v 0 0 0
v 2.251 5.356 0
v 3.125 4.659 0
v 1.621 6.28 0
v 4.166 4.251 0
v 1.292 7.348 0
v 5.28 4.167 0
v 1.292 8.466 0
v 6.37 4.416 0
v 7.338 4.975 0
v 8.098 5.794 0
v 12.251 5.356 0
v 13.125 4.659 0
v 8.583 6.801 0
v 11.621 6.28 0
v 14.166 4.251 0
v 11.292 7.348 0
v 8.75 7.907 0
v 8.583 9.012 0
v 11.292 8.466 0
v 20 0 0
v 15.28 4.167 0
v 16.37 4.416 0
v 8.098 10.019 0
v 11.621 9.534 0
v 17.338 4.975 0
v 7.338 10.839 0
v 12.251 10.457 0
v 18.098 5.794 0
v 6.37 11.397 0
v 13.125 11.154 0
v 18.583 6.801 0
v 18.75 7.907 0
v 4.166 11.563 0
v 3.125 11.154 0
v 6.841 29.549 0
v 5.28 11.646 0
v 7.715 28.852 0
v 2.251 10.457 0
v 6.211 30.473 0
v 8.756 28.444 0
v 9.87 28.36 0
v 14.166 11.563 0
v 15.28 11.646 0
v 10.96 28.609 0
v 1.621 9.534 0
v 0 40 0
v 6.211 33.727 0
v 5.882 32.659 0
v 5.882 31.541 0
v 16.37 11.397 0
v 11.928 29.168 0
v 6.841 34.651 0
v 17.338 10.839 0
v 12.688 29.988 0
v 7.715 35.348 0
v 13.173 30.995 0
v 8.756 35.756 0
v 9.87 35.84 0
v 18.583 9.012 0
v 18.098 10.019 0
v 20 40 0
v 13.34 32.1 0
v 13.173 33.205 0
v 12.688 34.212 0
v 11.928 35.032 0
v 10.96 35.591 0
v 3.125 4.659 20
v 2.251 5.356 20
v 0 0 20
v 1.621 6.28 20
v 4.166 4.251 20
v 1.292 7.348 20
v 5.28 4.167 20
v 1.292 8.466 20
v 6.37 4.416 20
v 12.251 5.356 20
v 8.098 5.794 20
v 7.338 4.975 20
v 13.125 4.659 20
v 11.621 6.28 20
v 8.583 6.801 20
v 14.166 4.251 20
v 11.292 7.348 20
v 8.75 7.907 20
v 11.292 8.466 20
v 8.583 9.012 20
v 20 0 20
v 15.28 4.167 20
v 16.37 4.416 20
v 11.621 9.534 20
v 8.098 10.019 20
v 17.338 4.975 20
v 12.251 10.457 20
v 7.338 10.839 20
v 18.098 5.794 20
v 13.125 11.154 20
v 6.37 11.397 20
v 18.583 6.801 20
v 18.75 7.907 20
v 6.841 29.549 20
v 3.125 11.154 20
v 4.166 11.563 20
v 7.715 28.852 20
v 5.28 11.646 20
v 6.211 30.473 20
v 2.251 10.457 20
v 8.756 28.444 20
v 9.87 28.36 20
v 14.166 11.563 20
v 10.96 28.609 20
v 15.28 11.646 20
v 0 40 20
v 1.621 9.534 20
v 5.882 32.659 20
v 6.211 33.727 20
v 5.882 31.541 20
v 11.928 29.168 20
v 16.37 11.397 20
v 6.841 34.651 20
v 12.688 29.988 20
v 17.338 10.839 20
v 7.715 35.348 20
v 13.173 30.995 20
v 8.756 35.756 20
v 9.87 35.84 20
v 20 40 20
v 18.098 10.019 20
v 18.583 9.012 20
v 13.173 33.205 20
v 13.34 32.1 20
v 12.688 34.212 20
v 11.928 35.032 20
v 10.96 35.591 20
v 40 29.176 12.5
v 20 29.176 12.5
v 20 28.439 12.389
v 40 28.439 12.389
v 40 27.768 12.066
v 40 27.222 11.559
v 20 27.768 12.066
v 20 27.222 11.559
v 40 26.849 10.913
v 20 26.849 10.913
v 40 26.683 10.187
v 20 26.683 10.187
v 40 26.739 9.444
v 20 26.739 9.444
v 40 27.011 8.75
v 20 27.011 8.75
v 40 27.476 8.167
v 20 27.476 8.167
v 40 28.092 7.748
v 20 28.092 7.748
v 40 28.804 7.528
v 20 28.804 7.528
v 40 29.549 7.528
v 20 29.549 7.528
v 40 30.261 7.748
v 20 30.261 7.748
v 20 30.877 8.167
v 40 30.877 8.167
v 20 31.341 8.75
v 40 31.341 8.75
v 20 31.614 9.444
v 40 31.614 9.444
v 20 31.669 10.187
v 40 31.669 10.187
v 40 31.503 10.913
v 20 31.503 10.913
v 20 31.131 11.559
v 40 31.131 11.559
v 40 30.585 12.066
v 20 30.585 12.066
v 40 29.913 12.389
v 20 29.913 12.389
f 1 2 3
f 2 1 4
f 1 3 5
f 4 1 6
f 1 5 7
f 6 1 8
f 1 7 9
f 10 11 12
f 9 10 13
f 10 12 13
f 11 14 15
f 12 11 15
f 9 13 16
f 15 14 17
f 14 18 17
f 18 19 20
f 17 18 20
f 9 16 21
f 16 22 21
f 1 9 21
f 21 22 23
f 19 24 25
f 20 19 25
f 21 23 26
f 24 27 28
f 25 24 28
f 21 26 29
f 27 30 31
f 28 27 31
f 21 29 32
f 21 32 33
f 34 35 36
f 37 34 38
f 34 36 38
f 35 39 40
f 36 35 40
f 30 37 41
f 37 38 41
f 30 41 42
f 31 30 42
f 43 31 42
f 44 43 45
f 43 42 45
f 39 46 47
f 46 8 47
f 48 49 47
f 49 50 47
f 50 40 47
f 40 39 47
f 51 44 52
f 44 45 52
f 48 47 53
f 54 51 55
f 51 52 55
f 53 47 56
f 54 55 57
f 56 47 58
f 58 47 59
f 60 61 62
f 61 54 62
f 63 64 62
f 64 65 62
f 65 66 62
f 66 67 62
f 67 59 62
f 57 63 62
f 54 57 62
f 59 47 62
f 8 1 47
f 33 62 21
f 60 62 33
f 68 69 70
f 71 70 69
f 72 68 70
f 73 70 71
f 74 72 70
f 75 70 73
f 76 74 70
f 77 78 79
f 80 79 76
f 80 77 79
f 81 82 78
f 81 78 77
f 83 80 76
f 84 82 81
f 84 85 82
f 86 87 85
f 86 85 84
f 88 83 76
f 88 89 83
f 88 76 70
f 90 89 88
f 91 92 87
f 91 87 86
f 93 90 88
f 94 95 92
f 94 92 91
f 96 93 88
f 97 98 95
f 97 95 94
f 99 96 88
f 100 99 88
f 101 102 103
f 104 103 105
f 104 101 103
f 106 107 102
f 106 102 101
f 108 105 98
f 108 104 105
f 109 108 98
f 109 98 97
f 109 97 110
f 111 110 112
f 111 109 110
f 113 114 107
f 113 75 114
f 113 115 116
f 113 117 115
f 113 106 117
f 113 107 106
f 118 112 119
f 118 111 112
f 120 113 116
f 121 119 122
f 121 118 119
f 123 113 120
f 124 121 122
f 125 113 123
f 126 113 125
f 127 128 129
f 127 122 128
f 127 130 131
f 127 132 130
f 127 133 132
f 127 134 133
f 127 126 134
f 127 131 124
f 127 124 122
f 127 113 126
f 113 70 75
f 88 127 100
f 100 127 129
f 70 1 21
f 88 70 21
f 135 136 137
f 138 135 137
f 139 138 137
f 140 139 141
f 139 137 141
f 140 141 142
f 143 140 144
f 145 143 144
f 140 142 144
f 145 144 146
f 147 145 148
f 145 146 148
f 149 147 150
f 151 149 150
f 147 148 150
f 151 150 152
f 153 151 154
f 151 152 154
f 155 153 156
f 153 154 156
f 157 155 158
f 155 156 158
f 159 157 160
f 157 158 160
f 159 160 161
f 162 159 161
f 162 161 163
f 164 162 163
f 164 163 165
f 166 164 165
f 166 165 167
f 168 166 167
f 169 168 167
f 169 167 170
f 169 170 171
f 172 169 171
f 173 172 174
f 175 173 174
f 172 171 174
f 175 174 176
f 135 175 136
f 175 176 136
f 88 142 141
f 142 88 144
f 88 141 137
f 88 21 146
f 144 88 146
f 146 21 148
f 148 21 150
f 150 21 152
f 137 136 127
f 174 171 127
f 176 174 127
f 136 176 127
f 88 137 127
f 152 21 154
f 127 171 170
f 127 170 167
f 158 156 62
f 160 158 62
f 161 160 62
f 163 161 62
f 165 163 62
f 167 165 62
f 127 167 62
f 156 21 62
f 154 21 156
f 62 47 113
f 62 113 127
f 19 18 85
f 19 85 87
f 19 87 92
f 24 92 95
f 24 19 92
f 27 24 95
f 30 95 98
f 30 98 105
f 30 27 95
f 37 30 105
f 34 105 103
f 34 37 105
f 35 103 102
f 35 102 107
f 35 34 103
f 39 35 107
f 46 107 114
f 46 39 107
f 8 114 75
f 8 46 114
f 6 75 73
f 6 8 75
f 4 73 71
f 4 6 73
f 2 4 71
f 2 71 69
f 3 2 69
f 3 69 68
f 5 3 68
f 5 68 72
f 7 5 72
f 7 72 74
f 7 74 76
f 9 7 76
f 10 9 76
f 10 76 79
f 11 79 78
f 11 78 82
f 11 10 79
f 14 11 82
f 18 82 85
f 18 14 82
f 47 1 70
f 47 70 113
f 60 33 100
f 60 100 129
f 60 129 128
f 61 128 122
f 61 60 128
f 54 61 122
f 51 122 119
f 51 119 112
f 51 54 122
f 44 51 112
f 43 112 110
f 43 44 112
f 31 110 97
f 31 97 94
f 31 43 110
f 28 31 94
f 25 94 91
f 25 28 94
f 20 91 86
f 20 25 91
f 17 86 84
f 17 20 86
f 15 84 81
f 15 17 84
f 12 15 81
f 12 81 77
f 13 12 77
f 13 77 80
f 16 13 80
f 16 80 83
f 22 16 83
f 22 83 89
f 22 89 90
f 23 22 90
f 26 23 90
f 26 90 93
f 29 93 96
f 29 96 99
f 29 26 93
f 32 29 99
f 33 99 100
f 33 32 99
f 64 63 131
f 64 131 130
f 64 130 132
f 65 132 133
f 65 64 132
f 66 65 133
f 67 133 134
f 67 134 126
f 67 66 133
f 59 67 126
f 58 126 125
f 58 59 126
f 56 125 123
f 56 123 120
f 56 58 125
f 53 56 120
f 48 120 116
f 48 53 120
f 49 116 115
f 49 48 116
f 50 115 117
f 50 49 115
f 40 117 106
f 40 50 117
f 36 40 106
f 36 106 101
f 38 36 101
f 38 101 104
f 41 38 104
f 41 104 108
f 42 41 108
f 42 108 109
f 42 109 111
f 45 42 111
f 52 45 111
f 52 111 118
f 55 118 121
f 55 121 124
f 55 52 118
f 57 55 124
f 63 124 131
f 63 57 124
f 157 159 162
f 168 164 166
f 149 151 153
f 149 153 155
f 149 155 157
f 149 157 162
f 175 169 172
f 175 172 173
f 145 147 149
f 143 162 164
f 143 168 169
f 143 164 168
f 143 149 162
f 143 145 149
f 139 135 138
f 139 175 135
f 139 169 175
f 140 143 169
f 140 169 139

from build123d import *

# Parameters (mm, degrees)
SKETCH7_W           = 20
SKETCH7_H           = 40
SKETCH7_R           = 3.75
BOSS_EXTRUDE4_DEPTH = 20
SKETCH8_R           = 2.5
BOSS_EXTRUDE5_DEPTH = 20


with BuildPart() as part:
    # Sketch7 → Boss-Extrude4 (new body)
    with BuildSketch(Plane.XY):
        with Locations((10, 20)):
            Rectangle(SKETCH7_W, SKETCH7_H)
        with Locations((15, 7.90672248)):
            Circle(SKETCH7_R, mode=Mode.SUBTRACT)
        with Locations((5, 7.90672248)):
            Circle(SKETCH7_R, mode=Mode.SUBTRACT)
        with Locations((9.590015998, 32.1)):
            Circle(SKETCH7_R, mode=Mode.SUBTRACT)
    extrude(amount=BOSS_EXTRUDE4_DEPTH)

    # Sketch8 → Boss-Extrude5 (add)
    with BuildSketch(Plane(origin=(20, 0, 0), x_dir=(0, 0, -1), z_dir=(1, 0, 0))):
        with Locations(Location((-10, 29.176257045, 0), (0, 0, 180))):
            Circle(SKETCH8_R)
    extrude(amount=BOSS_EXTRUDE5_DEPTH)


solid = part.part
